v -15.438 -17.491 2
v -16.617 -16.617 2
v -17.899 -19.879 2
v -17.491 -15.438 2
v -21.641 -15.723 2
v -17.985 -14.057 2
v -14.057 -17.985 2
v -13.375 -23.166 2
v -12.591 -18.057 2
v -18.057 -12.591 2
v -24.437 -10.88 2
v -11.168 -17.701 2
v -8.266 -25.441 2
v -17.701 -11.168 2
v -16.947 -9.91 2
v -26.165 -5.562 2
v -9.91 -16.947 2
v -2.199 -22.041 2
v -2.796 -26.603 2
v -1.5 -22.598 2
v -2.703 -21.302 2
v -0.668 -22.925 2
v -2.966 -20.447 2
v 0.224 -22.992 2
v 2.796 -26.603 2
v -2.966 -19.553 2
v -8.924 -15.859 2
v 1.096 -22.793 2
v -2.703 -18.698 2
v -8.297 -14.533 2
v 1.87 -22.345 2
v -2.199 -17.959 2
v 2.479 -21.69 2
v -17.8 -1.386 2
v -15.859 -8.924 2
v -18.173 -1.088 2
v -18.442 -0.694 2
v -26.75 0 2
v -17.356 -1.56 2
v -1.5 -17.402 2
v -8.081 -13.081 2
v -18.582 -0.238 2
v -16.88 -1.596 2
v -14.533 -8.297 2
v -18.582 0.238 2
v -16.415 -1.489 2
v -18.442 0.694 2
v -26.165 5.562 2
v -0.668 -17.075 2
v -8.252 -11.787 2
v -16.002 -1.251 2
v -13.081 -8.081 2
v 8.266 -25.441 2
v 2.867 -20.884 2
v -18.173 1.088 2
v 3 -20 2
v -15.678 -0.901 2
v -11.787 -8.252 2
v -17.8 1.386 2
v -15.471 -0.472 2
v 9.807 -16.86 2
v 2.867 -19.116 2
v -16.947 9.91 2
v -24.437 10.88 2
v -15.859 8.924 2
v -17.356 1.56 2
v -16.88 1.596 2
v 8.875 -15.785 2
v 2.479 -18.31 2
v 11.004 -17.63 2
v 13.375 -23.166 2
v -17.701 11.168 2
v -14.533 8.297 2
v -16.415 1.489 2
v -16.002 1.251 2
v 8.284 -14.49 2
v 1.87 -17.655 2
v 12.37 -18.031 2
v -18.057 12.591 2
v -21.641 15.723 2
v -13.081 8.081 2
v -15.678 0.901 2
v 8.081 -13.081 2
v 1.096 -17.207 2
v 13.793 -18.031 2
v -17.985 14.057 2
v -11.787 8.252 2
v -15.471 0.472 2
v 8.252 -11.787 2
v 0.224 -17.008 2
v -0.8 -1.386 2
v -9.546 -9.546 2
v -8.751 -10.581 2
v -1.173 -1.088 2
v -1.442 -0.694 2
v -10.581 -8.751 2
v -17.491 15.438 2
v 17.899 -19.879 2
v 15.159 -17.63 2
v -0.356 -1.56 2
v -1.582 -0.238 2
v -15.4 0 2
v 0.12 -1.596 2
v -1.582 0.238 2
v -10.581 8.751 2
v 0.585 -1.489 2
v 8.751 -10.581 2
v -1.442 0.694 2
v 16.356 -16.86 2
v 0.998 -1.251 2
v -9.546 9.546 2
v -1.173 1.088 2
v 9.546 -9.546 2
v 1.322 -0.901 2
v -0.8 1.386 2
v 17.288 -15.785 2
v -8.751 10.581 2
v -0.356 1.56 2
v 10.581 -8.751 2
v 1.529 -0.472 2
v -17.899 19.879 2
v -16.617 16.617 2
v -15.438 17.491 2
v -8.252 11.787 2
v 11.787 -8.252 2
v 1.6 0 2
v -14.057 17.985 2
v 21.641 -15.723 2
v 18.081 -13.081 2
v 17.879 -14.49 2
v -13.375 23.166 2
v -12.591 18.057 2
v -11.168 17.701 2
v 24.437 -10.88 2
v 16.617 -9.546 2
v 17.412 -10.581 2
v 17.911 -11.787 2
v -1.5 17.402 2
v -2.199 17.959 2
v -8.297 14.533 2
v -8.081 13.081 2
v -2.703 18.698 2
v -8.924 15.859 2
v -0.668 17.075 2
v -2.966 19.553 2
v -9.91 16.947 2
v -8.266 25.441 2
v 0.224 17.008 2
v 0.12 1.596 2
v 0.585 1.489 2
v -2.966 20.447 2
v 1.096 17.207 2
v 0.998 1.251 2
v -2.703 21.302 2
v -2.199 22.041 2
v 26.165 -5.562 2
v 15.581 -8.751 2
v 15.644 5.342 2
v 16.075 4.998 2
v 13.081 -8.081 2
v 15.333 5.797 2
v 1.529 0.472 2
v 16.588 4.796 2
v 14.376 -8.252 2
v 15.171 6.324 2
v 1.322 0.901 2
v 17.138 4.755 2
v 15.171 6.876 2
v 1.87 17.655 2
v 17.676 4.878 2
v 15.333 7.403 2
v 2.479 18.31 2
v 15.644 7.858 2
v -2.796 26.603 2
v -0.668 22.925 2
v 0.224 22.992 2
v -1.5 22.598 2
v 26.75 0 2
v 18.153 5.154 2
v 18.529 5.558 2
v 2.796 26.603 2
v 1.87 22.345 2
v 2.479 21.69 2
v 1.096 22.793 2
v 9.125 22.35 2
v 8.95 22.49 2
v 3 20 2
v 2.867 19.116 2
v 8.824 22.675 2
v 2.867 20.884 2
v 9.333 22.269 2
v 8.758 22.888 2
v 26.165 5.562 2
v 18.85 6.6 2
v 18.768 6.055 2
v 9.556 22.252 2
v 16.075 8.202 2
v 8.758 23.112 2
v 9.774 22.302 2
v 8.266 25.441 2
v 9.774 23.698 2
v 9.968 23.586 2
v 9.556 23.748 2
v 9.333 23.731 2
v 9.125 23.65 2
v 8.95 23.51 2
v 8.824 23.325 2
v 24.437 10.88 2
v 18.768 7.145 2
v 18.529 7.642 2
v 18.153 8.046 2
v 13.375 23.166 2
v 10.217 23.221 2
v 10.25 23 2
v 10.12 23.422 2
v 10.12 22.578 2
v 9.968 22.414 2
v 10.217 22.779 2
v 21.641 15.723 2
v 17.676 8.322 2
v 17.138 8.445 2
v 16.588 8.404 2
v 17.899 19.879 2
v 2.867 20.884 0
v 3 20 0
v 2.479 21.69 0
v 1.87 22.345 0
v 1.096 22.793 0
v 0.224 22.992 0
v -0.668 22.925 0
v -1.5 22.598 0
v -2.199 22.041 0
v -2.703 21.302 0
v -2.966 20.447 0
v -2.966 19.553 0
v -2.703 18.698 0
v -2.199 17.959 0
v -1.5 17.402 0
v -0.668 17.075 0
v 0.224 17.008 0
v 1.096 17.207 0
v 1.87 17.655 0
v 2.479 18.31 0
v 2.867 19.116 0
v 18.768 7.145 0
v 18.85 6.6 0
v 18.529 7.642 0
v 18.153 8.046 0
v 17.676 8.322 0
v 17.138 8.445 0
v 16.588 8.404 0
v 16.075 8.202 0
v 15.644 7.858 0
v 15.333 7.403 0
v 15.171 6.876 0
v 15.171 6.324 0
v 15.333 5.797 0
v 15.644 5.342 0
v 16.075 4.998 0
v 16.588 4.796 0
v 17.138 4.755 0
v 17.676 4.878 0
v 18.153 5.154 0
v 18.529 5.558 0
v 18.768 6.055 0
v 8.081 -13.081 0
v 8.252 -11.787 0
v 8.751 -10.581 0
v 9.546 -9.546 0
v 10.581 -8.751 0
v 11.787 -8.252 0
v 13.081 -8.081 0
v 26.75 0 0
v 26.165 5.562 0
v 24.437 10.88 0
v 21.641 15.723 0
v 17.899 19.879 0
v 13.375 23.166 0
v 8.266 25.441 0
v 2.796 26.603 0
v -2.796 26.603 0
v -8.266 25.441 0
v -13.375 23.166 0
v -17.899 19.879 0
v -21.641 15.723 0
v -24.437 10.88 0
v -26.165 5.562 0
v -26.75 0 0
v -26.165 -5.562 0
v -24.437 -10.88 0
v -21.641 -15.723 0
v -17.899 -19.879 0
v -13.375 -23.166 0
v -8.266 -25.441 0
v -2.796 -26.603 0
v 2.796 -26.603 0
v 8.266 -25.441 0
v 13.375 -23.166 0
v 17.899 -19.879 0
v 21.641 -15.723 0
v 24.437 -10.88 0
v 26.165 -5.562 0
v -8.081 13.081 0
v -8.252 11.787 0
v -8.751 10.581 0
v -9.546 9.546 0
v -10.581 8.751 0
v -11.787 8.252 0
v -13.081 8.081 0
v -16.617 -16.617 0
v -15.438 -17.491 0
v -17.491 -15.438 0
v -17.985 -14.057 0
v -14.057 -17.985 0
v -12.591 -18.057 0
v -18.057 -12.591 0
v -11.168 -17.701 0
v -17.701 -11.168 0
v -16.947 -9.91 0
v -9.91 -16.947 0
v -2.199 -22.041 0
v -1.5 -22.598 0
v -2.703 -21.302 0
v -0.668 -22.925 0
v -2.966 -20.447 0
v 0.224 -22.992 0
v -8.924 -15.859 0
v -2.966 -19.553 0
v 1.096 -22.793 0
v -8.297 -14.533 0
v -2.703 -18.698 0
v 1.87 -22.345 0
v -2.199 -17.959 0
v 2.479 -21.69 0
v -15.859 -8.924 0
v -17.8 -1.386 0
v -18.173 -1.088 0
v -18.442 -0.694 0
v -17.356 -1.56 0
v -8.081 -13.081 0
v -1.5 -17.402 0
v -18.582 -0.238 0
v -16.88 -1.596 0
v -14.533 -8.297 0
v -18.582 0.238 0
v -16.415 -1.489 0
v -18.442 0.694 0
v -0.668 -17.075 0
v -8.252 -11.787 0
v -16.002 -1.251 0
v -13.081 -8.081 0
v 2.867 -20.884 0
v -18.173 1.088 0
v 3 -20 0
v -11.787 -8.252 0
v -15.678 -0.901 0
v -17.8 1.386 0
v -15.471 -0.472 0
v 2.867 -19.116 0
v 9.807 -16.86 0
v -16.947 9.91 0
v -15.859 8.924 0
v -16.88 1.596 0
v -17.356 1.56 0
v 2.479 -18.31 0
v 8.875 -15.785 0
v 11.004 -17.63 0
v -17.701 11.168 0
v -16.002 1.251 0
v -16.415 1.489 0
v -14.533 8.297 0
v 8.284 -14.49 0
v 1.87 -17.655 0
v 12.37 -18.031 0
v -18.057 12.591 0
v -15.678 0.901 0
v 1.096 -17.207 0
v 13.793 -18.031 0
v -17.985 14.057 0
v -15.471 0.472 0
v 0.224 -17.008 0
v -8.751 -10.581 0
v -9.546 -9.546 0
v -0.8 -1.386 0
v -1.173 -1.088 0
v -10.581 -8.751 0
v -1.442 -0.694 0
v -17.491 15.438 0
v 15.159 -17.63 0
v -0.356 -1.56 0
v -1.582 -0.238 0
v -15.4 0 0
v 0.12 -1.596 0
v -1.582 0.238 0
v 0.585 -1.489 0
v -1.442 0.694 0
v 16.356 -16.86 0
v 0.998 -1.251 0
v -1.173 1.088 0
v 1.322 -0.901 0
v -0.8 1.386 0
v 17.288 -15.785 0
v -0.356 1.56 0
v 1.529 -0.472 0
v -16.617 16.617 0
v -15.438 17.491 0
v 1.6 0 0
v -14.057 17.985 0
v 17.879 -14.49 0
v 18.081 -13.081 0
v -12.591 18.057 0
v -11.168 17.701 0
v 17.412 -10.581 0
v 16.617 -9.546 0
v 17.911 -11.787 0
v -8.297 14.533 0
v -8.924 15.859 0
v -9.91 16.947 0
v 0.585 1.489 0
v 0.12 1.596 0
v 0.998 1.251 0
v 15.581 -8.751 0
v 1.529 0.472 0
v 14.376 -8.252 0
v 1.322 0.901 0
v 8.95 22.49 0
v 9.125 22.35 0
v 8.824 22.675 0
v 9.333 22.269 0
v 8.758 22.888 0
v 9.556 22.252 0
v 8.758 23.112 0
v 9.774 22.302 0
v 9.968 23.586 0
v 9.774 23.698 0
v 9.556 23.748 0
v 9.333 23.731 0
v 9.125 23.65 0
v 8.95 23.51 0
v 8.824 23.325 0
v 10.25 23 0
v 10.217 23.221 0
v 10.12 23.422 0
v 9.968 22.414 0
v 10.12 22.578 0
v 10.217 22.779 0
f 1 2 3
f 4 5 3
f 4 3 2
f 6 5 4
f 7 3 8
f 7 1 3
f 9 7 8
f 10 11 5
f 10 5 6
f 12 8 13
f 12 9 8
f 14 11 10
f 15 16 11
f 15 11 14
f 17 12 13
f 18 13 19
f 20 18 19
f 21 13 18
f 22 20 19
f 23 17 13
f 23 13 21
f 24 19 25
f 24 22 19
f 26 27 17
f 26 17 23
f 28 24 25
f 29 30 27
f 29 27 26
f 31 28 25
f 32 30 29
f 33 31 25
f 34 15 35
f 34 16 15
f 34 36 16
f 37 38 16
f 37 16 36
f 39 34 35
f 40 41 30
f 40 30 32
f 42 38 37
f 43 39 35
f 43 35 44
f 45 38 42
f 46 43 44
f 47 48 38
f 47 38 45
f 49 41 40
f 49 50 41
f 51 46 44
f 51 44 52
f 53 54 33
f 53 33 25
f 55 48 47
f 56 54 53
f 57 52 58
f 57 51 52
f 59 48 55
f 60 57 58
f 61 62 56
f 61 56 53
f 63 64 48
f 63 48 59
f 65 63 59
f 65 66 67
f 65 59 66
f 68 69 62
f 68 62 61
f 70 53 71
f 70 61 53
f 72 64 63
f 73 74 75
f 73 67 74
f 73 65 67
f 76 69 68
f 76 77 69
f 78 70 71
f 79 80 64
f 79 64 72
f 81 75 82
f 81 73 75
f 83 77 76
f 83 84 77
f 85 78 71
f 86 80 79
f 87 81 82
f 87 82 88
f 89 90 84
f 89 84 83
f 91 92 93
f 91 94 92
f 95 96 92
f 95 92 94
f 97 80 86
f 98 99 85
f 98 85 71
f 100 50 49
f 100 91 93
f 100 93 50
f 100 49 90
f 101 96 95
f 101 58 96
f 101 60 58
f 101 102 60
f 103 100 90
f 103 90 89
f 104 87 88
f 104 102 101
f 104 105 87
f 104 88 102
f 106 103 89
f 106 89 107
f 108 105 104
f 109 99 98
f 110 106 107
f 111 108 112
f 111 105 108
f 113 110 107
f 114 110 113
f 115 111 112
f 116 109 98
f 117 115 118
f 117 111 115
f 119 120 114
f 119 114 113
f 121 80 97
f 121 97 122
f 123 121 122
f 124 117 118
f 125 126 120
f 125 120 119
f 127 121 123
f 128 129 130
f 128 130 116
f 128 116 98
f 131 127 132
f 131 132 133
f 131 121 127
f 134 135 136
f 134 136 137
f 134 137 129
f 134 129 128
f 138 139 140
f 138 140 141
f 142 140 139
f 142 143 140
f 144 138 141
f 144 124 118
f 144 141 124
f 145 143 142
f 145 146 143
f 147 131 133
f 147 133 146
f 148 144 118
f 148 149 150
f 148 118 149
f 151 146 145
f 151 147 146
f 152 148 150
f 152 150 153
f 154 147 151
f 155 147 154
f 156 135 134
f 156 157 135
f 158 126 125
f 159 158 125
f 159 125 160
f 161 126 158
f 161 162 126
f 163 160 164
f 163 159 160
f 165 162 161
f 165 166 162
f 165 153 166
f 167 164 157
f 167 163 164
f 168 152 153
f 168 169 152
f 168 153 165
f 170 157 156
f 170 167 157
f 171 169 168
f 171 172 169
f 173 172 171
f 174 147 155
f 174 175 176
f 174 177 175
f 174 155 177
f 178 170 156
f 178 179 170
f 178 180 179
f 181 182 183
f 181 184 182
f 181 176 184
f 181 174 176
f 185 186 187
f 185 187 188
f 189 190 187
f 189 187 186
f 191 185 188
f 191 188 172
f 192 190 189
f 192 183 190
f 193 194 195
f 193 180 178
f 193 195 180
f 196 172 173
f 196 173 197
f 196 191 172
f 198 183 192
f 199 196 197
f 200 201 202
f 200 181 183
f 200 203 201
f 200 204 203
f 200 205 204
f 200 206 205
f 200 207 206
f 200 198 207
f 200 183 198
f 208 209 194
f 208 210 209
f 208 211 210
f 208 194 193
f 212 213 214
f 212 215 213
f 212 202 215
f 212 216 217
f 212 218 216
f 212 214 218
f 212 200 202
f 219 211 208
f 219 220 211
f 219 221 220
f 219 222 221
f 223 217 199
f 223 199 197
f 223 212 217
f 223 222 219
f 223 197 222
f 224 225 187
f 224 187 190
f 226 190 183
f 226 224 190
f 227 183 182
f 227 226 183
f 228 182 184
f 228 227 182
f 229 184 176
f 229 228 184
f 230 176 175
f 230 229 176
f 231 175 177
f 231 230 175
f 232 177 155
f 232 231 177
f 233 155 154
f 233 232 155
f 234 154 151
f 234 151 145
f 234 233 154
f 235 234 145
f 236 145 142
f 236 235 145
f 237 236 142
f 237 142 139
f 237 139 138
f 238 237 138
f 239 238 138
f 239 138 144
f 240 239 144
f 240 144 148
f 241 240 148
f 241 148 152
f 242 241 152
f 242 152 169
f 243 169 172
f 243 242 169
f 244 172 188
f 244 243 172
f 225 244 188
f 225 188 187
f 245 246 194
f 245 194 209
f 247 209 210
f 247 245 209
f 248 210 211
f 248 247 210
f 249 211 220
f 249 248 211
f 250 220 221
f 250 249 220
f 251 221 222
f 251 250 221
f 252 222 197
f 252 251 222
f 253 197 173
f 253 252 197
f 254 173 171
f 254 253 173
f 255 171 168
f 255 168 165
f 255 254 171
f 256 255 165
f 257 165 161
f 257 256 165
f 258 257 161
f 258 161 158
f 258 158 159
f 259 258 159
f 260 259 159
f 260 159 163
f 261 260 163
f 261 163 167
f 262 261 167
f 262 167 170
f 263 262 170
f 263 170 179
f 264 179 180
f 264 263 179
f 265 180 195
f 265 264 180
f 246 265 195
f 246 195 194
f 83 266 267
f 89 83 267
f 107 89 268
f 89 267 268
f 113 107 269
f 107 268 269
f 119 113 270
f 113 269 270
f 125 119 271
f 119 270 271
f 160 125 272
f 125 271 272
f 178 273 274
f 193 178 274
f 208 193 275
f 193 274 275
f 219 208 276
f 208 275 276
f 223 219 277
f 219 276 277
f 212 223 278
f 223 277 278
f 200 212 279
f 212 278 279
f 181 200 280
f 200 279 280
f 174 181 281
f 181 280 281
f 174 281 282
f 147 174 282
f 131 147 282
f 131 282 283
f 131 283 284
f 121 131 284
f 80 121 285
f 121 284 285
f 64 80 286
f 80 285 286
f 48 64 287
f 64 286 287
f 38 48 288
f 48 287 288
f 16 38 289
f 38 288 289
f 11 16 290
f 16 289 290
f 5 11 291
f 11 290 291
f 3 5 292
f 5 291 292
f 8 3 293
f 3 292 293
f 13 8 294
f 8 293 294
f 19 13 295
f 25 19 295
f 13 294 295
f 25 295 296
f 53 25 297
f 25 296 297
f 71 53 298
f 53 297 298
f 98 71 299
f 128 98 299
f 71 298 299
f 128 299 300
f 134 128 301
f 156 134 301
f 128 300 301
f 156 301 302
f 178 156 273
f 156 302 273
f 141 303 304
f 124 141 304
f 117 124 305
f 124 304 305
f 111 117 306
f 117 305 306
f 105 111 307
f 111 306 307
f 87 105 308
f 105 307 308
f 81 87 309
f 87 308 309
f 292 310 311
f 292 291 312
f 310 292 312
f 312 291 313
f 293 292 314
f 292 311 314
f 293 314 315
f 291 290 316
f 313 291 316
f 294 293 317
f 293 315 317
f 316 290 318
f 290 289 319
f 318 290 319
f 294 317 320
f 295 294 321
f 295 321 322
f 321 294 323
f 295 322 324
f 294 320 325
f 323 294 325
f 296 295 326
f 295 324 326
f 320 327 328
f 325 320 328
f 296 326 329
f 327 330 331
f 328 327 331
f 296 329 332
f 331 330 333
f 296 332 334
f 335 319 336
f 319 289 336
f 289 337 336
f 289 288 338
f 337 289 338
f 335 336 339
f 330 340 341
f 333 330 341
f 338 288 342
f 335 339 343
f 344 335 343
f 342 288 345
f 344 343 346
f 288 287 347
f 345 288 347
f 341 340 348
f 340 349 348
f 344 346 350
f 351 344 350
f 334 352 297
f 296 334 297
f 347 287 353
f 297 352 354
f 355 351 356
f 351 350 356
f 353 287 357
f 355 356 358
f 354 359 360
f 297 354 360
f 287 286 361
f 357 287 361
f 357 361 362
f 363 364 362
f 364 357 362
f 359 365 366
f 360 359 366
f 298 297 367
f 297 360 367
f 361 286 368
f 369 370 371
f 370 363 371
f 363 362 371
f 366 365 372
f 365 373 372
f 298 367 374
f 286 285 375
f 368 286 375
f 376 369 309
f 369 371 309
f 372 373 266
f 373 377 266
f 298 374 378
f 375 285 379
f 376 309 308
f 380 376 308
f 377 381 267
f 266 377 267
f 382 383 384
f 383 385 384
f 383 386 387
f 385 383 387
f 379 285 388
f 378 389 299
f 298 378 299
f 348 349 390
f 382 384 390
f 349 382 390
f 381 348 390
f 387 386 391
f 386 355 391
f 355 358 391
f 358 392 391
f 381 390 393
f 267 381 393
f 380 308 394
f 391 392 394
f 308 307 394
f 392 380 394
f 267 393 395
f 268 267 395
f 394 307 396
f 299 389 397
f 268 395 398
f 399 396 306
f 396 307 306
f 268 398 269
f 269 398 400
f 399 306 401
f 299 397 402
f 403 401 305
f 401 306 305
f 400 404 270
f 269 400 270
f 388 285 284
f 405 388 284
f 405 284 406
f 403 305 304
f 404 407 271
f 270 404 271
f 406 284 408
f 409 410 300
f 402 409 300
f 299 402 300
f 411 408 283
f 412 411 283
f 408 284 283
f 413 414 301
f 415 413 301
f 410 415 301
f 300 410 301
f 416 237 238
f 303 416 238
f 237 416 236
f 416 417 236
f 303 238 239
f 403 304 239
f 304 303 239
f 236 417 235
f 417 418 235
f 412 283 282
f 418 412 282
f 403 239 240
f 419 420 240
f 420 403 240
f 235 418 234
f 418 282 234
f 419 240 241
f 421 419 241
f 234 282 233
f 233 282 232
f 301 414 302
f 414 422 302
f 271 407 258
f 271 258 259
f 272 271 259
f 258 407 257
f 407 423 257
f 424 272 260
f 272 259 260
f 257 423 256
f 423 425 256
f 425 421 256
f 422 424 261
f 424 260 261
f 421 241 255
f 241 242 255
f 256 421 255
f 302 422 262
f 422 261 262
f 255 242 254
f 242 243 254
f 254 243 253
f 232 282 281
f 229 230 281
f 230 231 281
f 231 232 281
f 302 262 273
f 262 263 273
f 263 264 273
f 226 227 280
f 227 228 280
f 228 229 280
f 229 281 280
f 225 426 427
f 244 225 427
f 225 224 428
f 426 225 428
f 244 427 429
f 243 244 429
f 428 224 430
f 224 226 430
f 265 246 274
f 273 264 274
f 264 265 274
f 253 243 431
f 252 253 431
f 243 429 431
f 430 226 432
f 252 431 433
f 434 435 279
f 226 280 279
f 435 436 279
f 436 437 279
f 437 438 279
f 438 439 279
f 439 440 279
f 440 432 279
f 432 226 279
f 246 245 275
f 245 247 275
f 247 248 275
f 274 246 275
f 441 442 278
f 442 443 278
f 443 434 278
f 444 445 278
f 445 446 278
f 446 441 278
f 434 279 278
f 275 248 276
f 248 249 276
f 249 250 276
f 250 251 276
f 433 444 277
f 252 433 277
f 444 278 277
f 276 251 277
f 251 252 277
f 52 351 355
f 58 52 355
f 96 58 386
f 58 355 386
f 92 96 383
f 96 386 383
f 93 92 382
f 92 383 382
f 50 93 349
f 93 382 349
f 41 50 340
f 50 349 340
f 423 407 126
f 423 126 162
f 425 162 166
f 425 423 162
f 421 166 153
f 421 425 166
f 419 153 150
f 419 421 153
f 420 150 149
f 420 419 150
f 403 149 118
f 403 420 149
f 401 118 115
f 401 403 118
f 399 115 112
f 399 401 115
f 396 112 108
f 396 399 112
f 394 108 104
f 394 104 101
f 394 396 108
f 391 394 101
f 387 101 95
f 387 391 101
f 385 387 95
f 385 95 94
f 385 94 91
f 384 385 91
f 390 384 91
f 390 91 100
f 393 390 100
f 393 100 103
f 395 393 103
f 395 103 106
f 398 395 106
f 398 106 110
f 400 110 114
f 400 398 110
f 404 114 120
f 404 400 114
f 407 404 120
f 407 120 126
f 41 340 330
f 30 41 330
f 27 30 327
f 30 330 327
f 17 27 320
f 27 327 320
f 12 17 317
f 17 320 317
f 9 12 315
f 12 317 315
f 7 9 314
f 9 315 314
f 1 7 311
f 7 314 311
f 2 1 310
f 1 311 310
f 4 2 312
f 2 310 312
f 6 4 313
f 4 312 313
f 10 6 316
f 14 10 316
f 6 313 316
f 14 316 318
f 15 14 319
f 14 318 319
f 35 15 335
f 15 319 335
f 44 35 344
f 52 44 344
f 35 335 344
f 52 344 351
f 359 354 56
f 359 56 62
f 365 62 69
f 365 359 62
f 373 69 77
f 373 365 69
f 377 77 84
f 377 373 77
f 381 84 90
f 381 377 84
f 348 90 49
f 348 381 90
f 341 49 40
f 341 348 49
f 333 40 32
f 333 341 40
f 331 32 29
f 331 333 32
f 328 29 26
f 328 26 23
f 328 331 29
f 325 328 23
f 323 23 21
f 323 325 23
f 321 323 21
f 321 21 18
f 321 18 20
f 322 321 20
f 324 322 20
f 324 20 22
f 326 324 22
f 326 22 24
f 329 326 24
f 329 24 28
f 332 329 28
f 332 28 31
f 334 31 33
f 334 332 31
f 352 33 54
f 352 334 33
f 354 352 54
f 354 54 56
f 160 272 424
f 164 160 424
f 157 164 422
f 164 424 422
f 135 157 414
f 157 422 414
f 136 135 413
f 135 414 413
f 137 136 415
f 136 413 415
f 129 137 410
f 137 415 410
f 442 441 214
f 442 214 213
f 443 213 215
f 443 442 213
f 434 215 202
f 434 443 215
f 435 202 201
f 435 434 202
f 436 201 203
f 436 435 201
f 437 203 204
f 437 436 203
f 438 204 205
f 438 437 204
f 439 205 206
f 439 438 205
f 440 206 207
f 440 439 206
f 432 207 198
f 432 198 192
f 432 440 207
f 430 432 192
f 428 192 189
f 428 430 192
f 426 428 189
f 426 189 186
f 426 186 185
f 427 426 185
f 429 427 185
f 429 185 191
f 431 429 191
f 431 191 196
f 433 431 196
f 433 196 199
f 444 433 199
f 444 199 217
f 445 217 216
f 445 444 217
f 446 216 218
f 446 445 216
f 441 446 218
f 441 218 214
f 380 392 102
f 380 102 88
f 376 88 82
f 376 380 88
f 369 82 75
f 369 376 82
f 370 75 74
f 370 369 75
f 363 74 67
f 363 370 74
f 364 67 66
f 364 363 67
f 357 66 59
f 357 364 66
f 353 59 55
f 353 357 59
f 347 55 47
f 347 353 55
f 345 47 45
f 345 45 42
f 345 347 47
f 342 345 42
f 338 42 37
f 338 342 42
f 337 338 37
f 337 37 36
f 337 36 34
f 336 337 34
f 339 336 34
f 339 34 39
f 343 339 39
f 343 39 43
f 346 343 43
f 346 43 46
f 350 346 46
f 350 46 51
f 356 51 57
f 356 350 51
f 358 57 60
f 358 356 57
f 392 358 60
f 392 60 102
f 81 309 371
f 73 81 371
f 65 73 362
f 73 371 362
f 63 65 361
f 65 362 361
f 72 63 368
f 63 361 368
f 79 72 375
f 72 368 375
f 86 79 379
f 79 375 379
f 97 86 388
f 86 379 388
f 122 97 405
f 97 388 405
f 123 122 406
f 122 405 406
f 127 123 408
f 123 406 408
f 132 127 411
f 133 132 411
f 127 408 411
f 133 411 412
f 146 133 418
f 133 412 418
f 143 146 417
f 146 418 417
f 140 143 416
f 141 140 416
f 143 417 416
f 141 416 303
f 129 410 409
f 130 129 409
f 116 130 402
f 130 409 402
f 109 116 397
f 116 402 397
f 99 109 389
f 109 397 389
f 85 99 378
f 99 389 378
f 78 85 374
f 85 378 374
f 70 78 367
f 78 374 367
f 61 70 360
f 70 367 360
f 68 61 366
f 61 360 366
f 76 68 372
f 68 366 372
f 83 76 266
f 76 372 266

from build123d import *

# Parameters (mm, degrees)
F0_R     = 26.75
F0_R_2   = 3
F0_R_3   = 1.6
F0_R_4   = 1.85
F0_R_5   = 0.75
F1_DEPTH = 2


# Not quite as in the source:
# - a feature names something its author has since deleted; it is built from what else it names


with BuildPart() as f1:
    # F0 (on Top) → F1 (new body)
    with BuildSketch(Plane.XY):
        Circle(F0_R)
        with Locations((0, -20)):
            Circle(F0_R_2, mode=Mode.SUBTRACT)
        with Locations((-17, 0)):
            Circle(F0_R_3, mode=Mode.SUBTRACT)
        with BuildLine():
            Line((-8.081475452, 13.081475452), (13.081475452, 13.081475452))
            Line((13.081475452, 13.081475452), (13.081475452, -8.081475452))
            ThreePointArc((13.081475452, -8.081475452), (16.6170093579, -9.545941546), (18.081475452, -13.081475452))
            ThreePointArc((18.081475452, -13.081475452), (13.081475452, -18.081475452), (8.081475452, -13.081475452))
            Line((8.081475452, -13.081475452), (-8.081475452, -13.081475452))
            ThreePointArc((-8.081475452, -13.081475452), (-16.6170093579, -16.6170093579), (-13.081475452, -8.081475452))
            Line((-13.081475452, -8.081475452), (-13.081475452, 8.081475452))
            ThreePointArc((-13.081475452, 8.081475452), (-16.6170093579, 16.6170093579), (-8.081475452, 13.081475452))
        make_face(mode=Mode.SUBTRACT)
        with Locations((0, 20)):
            Circle(F0_R_2, mode=Mode.SUBTRACT)
        with Locations((17, 6.6)):
            Circle(F0_R_4, mode=Mode.SUBTRACT)
        with Locations((9.5, 23)):
            Circle(F0_R_5, mode=Mode.SUBTRACT)
        with BuildLine():
            Line((13.081475452, -8.081475452), (13.081475452, 13.081475452))
            Line((13.081475452, 13.081475452), (-8.081475452, 13.081475452))
            ThreePointArc((-8.081475452, 13.081475452), (-9.545941546, 9.545941546), (-13.081475452, 8.081475452))
            Line((-13.081475452, 8.081475452), (-13.081475452, -8.081475452))
            ThreePointArc((-13.081475452, -8.081475452), (-9.545941546, -9.545941546), (-8.081475452, -13.081475452))
            Line((-8.081475452, -13.081475452), (8.081475452, -13.081475452))
            ThreePointArc((8.081475452, -13.081475452), (9.545941546, -9.545941546), (13.081475452, -8.081475452))
        make_face()
        Circle(F0_R_3, mode=Mode.SUBTRACT)
    extrude(amount=F1_DEPTH)


solid = f1.part
